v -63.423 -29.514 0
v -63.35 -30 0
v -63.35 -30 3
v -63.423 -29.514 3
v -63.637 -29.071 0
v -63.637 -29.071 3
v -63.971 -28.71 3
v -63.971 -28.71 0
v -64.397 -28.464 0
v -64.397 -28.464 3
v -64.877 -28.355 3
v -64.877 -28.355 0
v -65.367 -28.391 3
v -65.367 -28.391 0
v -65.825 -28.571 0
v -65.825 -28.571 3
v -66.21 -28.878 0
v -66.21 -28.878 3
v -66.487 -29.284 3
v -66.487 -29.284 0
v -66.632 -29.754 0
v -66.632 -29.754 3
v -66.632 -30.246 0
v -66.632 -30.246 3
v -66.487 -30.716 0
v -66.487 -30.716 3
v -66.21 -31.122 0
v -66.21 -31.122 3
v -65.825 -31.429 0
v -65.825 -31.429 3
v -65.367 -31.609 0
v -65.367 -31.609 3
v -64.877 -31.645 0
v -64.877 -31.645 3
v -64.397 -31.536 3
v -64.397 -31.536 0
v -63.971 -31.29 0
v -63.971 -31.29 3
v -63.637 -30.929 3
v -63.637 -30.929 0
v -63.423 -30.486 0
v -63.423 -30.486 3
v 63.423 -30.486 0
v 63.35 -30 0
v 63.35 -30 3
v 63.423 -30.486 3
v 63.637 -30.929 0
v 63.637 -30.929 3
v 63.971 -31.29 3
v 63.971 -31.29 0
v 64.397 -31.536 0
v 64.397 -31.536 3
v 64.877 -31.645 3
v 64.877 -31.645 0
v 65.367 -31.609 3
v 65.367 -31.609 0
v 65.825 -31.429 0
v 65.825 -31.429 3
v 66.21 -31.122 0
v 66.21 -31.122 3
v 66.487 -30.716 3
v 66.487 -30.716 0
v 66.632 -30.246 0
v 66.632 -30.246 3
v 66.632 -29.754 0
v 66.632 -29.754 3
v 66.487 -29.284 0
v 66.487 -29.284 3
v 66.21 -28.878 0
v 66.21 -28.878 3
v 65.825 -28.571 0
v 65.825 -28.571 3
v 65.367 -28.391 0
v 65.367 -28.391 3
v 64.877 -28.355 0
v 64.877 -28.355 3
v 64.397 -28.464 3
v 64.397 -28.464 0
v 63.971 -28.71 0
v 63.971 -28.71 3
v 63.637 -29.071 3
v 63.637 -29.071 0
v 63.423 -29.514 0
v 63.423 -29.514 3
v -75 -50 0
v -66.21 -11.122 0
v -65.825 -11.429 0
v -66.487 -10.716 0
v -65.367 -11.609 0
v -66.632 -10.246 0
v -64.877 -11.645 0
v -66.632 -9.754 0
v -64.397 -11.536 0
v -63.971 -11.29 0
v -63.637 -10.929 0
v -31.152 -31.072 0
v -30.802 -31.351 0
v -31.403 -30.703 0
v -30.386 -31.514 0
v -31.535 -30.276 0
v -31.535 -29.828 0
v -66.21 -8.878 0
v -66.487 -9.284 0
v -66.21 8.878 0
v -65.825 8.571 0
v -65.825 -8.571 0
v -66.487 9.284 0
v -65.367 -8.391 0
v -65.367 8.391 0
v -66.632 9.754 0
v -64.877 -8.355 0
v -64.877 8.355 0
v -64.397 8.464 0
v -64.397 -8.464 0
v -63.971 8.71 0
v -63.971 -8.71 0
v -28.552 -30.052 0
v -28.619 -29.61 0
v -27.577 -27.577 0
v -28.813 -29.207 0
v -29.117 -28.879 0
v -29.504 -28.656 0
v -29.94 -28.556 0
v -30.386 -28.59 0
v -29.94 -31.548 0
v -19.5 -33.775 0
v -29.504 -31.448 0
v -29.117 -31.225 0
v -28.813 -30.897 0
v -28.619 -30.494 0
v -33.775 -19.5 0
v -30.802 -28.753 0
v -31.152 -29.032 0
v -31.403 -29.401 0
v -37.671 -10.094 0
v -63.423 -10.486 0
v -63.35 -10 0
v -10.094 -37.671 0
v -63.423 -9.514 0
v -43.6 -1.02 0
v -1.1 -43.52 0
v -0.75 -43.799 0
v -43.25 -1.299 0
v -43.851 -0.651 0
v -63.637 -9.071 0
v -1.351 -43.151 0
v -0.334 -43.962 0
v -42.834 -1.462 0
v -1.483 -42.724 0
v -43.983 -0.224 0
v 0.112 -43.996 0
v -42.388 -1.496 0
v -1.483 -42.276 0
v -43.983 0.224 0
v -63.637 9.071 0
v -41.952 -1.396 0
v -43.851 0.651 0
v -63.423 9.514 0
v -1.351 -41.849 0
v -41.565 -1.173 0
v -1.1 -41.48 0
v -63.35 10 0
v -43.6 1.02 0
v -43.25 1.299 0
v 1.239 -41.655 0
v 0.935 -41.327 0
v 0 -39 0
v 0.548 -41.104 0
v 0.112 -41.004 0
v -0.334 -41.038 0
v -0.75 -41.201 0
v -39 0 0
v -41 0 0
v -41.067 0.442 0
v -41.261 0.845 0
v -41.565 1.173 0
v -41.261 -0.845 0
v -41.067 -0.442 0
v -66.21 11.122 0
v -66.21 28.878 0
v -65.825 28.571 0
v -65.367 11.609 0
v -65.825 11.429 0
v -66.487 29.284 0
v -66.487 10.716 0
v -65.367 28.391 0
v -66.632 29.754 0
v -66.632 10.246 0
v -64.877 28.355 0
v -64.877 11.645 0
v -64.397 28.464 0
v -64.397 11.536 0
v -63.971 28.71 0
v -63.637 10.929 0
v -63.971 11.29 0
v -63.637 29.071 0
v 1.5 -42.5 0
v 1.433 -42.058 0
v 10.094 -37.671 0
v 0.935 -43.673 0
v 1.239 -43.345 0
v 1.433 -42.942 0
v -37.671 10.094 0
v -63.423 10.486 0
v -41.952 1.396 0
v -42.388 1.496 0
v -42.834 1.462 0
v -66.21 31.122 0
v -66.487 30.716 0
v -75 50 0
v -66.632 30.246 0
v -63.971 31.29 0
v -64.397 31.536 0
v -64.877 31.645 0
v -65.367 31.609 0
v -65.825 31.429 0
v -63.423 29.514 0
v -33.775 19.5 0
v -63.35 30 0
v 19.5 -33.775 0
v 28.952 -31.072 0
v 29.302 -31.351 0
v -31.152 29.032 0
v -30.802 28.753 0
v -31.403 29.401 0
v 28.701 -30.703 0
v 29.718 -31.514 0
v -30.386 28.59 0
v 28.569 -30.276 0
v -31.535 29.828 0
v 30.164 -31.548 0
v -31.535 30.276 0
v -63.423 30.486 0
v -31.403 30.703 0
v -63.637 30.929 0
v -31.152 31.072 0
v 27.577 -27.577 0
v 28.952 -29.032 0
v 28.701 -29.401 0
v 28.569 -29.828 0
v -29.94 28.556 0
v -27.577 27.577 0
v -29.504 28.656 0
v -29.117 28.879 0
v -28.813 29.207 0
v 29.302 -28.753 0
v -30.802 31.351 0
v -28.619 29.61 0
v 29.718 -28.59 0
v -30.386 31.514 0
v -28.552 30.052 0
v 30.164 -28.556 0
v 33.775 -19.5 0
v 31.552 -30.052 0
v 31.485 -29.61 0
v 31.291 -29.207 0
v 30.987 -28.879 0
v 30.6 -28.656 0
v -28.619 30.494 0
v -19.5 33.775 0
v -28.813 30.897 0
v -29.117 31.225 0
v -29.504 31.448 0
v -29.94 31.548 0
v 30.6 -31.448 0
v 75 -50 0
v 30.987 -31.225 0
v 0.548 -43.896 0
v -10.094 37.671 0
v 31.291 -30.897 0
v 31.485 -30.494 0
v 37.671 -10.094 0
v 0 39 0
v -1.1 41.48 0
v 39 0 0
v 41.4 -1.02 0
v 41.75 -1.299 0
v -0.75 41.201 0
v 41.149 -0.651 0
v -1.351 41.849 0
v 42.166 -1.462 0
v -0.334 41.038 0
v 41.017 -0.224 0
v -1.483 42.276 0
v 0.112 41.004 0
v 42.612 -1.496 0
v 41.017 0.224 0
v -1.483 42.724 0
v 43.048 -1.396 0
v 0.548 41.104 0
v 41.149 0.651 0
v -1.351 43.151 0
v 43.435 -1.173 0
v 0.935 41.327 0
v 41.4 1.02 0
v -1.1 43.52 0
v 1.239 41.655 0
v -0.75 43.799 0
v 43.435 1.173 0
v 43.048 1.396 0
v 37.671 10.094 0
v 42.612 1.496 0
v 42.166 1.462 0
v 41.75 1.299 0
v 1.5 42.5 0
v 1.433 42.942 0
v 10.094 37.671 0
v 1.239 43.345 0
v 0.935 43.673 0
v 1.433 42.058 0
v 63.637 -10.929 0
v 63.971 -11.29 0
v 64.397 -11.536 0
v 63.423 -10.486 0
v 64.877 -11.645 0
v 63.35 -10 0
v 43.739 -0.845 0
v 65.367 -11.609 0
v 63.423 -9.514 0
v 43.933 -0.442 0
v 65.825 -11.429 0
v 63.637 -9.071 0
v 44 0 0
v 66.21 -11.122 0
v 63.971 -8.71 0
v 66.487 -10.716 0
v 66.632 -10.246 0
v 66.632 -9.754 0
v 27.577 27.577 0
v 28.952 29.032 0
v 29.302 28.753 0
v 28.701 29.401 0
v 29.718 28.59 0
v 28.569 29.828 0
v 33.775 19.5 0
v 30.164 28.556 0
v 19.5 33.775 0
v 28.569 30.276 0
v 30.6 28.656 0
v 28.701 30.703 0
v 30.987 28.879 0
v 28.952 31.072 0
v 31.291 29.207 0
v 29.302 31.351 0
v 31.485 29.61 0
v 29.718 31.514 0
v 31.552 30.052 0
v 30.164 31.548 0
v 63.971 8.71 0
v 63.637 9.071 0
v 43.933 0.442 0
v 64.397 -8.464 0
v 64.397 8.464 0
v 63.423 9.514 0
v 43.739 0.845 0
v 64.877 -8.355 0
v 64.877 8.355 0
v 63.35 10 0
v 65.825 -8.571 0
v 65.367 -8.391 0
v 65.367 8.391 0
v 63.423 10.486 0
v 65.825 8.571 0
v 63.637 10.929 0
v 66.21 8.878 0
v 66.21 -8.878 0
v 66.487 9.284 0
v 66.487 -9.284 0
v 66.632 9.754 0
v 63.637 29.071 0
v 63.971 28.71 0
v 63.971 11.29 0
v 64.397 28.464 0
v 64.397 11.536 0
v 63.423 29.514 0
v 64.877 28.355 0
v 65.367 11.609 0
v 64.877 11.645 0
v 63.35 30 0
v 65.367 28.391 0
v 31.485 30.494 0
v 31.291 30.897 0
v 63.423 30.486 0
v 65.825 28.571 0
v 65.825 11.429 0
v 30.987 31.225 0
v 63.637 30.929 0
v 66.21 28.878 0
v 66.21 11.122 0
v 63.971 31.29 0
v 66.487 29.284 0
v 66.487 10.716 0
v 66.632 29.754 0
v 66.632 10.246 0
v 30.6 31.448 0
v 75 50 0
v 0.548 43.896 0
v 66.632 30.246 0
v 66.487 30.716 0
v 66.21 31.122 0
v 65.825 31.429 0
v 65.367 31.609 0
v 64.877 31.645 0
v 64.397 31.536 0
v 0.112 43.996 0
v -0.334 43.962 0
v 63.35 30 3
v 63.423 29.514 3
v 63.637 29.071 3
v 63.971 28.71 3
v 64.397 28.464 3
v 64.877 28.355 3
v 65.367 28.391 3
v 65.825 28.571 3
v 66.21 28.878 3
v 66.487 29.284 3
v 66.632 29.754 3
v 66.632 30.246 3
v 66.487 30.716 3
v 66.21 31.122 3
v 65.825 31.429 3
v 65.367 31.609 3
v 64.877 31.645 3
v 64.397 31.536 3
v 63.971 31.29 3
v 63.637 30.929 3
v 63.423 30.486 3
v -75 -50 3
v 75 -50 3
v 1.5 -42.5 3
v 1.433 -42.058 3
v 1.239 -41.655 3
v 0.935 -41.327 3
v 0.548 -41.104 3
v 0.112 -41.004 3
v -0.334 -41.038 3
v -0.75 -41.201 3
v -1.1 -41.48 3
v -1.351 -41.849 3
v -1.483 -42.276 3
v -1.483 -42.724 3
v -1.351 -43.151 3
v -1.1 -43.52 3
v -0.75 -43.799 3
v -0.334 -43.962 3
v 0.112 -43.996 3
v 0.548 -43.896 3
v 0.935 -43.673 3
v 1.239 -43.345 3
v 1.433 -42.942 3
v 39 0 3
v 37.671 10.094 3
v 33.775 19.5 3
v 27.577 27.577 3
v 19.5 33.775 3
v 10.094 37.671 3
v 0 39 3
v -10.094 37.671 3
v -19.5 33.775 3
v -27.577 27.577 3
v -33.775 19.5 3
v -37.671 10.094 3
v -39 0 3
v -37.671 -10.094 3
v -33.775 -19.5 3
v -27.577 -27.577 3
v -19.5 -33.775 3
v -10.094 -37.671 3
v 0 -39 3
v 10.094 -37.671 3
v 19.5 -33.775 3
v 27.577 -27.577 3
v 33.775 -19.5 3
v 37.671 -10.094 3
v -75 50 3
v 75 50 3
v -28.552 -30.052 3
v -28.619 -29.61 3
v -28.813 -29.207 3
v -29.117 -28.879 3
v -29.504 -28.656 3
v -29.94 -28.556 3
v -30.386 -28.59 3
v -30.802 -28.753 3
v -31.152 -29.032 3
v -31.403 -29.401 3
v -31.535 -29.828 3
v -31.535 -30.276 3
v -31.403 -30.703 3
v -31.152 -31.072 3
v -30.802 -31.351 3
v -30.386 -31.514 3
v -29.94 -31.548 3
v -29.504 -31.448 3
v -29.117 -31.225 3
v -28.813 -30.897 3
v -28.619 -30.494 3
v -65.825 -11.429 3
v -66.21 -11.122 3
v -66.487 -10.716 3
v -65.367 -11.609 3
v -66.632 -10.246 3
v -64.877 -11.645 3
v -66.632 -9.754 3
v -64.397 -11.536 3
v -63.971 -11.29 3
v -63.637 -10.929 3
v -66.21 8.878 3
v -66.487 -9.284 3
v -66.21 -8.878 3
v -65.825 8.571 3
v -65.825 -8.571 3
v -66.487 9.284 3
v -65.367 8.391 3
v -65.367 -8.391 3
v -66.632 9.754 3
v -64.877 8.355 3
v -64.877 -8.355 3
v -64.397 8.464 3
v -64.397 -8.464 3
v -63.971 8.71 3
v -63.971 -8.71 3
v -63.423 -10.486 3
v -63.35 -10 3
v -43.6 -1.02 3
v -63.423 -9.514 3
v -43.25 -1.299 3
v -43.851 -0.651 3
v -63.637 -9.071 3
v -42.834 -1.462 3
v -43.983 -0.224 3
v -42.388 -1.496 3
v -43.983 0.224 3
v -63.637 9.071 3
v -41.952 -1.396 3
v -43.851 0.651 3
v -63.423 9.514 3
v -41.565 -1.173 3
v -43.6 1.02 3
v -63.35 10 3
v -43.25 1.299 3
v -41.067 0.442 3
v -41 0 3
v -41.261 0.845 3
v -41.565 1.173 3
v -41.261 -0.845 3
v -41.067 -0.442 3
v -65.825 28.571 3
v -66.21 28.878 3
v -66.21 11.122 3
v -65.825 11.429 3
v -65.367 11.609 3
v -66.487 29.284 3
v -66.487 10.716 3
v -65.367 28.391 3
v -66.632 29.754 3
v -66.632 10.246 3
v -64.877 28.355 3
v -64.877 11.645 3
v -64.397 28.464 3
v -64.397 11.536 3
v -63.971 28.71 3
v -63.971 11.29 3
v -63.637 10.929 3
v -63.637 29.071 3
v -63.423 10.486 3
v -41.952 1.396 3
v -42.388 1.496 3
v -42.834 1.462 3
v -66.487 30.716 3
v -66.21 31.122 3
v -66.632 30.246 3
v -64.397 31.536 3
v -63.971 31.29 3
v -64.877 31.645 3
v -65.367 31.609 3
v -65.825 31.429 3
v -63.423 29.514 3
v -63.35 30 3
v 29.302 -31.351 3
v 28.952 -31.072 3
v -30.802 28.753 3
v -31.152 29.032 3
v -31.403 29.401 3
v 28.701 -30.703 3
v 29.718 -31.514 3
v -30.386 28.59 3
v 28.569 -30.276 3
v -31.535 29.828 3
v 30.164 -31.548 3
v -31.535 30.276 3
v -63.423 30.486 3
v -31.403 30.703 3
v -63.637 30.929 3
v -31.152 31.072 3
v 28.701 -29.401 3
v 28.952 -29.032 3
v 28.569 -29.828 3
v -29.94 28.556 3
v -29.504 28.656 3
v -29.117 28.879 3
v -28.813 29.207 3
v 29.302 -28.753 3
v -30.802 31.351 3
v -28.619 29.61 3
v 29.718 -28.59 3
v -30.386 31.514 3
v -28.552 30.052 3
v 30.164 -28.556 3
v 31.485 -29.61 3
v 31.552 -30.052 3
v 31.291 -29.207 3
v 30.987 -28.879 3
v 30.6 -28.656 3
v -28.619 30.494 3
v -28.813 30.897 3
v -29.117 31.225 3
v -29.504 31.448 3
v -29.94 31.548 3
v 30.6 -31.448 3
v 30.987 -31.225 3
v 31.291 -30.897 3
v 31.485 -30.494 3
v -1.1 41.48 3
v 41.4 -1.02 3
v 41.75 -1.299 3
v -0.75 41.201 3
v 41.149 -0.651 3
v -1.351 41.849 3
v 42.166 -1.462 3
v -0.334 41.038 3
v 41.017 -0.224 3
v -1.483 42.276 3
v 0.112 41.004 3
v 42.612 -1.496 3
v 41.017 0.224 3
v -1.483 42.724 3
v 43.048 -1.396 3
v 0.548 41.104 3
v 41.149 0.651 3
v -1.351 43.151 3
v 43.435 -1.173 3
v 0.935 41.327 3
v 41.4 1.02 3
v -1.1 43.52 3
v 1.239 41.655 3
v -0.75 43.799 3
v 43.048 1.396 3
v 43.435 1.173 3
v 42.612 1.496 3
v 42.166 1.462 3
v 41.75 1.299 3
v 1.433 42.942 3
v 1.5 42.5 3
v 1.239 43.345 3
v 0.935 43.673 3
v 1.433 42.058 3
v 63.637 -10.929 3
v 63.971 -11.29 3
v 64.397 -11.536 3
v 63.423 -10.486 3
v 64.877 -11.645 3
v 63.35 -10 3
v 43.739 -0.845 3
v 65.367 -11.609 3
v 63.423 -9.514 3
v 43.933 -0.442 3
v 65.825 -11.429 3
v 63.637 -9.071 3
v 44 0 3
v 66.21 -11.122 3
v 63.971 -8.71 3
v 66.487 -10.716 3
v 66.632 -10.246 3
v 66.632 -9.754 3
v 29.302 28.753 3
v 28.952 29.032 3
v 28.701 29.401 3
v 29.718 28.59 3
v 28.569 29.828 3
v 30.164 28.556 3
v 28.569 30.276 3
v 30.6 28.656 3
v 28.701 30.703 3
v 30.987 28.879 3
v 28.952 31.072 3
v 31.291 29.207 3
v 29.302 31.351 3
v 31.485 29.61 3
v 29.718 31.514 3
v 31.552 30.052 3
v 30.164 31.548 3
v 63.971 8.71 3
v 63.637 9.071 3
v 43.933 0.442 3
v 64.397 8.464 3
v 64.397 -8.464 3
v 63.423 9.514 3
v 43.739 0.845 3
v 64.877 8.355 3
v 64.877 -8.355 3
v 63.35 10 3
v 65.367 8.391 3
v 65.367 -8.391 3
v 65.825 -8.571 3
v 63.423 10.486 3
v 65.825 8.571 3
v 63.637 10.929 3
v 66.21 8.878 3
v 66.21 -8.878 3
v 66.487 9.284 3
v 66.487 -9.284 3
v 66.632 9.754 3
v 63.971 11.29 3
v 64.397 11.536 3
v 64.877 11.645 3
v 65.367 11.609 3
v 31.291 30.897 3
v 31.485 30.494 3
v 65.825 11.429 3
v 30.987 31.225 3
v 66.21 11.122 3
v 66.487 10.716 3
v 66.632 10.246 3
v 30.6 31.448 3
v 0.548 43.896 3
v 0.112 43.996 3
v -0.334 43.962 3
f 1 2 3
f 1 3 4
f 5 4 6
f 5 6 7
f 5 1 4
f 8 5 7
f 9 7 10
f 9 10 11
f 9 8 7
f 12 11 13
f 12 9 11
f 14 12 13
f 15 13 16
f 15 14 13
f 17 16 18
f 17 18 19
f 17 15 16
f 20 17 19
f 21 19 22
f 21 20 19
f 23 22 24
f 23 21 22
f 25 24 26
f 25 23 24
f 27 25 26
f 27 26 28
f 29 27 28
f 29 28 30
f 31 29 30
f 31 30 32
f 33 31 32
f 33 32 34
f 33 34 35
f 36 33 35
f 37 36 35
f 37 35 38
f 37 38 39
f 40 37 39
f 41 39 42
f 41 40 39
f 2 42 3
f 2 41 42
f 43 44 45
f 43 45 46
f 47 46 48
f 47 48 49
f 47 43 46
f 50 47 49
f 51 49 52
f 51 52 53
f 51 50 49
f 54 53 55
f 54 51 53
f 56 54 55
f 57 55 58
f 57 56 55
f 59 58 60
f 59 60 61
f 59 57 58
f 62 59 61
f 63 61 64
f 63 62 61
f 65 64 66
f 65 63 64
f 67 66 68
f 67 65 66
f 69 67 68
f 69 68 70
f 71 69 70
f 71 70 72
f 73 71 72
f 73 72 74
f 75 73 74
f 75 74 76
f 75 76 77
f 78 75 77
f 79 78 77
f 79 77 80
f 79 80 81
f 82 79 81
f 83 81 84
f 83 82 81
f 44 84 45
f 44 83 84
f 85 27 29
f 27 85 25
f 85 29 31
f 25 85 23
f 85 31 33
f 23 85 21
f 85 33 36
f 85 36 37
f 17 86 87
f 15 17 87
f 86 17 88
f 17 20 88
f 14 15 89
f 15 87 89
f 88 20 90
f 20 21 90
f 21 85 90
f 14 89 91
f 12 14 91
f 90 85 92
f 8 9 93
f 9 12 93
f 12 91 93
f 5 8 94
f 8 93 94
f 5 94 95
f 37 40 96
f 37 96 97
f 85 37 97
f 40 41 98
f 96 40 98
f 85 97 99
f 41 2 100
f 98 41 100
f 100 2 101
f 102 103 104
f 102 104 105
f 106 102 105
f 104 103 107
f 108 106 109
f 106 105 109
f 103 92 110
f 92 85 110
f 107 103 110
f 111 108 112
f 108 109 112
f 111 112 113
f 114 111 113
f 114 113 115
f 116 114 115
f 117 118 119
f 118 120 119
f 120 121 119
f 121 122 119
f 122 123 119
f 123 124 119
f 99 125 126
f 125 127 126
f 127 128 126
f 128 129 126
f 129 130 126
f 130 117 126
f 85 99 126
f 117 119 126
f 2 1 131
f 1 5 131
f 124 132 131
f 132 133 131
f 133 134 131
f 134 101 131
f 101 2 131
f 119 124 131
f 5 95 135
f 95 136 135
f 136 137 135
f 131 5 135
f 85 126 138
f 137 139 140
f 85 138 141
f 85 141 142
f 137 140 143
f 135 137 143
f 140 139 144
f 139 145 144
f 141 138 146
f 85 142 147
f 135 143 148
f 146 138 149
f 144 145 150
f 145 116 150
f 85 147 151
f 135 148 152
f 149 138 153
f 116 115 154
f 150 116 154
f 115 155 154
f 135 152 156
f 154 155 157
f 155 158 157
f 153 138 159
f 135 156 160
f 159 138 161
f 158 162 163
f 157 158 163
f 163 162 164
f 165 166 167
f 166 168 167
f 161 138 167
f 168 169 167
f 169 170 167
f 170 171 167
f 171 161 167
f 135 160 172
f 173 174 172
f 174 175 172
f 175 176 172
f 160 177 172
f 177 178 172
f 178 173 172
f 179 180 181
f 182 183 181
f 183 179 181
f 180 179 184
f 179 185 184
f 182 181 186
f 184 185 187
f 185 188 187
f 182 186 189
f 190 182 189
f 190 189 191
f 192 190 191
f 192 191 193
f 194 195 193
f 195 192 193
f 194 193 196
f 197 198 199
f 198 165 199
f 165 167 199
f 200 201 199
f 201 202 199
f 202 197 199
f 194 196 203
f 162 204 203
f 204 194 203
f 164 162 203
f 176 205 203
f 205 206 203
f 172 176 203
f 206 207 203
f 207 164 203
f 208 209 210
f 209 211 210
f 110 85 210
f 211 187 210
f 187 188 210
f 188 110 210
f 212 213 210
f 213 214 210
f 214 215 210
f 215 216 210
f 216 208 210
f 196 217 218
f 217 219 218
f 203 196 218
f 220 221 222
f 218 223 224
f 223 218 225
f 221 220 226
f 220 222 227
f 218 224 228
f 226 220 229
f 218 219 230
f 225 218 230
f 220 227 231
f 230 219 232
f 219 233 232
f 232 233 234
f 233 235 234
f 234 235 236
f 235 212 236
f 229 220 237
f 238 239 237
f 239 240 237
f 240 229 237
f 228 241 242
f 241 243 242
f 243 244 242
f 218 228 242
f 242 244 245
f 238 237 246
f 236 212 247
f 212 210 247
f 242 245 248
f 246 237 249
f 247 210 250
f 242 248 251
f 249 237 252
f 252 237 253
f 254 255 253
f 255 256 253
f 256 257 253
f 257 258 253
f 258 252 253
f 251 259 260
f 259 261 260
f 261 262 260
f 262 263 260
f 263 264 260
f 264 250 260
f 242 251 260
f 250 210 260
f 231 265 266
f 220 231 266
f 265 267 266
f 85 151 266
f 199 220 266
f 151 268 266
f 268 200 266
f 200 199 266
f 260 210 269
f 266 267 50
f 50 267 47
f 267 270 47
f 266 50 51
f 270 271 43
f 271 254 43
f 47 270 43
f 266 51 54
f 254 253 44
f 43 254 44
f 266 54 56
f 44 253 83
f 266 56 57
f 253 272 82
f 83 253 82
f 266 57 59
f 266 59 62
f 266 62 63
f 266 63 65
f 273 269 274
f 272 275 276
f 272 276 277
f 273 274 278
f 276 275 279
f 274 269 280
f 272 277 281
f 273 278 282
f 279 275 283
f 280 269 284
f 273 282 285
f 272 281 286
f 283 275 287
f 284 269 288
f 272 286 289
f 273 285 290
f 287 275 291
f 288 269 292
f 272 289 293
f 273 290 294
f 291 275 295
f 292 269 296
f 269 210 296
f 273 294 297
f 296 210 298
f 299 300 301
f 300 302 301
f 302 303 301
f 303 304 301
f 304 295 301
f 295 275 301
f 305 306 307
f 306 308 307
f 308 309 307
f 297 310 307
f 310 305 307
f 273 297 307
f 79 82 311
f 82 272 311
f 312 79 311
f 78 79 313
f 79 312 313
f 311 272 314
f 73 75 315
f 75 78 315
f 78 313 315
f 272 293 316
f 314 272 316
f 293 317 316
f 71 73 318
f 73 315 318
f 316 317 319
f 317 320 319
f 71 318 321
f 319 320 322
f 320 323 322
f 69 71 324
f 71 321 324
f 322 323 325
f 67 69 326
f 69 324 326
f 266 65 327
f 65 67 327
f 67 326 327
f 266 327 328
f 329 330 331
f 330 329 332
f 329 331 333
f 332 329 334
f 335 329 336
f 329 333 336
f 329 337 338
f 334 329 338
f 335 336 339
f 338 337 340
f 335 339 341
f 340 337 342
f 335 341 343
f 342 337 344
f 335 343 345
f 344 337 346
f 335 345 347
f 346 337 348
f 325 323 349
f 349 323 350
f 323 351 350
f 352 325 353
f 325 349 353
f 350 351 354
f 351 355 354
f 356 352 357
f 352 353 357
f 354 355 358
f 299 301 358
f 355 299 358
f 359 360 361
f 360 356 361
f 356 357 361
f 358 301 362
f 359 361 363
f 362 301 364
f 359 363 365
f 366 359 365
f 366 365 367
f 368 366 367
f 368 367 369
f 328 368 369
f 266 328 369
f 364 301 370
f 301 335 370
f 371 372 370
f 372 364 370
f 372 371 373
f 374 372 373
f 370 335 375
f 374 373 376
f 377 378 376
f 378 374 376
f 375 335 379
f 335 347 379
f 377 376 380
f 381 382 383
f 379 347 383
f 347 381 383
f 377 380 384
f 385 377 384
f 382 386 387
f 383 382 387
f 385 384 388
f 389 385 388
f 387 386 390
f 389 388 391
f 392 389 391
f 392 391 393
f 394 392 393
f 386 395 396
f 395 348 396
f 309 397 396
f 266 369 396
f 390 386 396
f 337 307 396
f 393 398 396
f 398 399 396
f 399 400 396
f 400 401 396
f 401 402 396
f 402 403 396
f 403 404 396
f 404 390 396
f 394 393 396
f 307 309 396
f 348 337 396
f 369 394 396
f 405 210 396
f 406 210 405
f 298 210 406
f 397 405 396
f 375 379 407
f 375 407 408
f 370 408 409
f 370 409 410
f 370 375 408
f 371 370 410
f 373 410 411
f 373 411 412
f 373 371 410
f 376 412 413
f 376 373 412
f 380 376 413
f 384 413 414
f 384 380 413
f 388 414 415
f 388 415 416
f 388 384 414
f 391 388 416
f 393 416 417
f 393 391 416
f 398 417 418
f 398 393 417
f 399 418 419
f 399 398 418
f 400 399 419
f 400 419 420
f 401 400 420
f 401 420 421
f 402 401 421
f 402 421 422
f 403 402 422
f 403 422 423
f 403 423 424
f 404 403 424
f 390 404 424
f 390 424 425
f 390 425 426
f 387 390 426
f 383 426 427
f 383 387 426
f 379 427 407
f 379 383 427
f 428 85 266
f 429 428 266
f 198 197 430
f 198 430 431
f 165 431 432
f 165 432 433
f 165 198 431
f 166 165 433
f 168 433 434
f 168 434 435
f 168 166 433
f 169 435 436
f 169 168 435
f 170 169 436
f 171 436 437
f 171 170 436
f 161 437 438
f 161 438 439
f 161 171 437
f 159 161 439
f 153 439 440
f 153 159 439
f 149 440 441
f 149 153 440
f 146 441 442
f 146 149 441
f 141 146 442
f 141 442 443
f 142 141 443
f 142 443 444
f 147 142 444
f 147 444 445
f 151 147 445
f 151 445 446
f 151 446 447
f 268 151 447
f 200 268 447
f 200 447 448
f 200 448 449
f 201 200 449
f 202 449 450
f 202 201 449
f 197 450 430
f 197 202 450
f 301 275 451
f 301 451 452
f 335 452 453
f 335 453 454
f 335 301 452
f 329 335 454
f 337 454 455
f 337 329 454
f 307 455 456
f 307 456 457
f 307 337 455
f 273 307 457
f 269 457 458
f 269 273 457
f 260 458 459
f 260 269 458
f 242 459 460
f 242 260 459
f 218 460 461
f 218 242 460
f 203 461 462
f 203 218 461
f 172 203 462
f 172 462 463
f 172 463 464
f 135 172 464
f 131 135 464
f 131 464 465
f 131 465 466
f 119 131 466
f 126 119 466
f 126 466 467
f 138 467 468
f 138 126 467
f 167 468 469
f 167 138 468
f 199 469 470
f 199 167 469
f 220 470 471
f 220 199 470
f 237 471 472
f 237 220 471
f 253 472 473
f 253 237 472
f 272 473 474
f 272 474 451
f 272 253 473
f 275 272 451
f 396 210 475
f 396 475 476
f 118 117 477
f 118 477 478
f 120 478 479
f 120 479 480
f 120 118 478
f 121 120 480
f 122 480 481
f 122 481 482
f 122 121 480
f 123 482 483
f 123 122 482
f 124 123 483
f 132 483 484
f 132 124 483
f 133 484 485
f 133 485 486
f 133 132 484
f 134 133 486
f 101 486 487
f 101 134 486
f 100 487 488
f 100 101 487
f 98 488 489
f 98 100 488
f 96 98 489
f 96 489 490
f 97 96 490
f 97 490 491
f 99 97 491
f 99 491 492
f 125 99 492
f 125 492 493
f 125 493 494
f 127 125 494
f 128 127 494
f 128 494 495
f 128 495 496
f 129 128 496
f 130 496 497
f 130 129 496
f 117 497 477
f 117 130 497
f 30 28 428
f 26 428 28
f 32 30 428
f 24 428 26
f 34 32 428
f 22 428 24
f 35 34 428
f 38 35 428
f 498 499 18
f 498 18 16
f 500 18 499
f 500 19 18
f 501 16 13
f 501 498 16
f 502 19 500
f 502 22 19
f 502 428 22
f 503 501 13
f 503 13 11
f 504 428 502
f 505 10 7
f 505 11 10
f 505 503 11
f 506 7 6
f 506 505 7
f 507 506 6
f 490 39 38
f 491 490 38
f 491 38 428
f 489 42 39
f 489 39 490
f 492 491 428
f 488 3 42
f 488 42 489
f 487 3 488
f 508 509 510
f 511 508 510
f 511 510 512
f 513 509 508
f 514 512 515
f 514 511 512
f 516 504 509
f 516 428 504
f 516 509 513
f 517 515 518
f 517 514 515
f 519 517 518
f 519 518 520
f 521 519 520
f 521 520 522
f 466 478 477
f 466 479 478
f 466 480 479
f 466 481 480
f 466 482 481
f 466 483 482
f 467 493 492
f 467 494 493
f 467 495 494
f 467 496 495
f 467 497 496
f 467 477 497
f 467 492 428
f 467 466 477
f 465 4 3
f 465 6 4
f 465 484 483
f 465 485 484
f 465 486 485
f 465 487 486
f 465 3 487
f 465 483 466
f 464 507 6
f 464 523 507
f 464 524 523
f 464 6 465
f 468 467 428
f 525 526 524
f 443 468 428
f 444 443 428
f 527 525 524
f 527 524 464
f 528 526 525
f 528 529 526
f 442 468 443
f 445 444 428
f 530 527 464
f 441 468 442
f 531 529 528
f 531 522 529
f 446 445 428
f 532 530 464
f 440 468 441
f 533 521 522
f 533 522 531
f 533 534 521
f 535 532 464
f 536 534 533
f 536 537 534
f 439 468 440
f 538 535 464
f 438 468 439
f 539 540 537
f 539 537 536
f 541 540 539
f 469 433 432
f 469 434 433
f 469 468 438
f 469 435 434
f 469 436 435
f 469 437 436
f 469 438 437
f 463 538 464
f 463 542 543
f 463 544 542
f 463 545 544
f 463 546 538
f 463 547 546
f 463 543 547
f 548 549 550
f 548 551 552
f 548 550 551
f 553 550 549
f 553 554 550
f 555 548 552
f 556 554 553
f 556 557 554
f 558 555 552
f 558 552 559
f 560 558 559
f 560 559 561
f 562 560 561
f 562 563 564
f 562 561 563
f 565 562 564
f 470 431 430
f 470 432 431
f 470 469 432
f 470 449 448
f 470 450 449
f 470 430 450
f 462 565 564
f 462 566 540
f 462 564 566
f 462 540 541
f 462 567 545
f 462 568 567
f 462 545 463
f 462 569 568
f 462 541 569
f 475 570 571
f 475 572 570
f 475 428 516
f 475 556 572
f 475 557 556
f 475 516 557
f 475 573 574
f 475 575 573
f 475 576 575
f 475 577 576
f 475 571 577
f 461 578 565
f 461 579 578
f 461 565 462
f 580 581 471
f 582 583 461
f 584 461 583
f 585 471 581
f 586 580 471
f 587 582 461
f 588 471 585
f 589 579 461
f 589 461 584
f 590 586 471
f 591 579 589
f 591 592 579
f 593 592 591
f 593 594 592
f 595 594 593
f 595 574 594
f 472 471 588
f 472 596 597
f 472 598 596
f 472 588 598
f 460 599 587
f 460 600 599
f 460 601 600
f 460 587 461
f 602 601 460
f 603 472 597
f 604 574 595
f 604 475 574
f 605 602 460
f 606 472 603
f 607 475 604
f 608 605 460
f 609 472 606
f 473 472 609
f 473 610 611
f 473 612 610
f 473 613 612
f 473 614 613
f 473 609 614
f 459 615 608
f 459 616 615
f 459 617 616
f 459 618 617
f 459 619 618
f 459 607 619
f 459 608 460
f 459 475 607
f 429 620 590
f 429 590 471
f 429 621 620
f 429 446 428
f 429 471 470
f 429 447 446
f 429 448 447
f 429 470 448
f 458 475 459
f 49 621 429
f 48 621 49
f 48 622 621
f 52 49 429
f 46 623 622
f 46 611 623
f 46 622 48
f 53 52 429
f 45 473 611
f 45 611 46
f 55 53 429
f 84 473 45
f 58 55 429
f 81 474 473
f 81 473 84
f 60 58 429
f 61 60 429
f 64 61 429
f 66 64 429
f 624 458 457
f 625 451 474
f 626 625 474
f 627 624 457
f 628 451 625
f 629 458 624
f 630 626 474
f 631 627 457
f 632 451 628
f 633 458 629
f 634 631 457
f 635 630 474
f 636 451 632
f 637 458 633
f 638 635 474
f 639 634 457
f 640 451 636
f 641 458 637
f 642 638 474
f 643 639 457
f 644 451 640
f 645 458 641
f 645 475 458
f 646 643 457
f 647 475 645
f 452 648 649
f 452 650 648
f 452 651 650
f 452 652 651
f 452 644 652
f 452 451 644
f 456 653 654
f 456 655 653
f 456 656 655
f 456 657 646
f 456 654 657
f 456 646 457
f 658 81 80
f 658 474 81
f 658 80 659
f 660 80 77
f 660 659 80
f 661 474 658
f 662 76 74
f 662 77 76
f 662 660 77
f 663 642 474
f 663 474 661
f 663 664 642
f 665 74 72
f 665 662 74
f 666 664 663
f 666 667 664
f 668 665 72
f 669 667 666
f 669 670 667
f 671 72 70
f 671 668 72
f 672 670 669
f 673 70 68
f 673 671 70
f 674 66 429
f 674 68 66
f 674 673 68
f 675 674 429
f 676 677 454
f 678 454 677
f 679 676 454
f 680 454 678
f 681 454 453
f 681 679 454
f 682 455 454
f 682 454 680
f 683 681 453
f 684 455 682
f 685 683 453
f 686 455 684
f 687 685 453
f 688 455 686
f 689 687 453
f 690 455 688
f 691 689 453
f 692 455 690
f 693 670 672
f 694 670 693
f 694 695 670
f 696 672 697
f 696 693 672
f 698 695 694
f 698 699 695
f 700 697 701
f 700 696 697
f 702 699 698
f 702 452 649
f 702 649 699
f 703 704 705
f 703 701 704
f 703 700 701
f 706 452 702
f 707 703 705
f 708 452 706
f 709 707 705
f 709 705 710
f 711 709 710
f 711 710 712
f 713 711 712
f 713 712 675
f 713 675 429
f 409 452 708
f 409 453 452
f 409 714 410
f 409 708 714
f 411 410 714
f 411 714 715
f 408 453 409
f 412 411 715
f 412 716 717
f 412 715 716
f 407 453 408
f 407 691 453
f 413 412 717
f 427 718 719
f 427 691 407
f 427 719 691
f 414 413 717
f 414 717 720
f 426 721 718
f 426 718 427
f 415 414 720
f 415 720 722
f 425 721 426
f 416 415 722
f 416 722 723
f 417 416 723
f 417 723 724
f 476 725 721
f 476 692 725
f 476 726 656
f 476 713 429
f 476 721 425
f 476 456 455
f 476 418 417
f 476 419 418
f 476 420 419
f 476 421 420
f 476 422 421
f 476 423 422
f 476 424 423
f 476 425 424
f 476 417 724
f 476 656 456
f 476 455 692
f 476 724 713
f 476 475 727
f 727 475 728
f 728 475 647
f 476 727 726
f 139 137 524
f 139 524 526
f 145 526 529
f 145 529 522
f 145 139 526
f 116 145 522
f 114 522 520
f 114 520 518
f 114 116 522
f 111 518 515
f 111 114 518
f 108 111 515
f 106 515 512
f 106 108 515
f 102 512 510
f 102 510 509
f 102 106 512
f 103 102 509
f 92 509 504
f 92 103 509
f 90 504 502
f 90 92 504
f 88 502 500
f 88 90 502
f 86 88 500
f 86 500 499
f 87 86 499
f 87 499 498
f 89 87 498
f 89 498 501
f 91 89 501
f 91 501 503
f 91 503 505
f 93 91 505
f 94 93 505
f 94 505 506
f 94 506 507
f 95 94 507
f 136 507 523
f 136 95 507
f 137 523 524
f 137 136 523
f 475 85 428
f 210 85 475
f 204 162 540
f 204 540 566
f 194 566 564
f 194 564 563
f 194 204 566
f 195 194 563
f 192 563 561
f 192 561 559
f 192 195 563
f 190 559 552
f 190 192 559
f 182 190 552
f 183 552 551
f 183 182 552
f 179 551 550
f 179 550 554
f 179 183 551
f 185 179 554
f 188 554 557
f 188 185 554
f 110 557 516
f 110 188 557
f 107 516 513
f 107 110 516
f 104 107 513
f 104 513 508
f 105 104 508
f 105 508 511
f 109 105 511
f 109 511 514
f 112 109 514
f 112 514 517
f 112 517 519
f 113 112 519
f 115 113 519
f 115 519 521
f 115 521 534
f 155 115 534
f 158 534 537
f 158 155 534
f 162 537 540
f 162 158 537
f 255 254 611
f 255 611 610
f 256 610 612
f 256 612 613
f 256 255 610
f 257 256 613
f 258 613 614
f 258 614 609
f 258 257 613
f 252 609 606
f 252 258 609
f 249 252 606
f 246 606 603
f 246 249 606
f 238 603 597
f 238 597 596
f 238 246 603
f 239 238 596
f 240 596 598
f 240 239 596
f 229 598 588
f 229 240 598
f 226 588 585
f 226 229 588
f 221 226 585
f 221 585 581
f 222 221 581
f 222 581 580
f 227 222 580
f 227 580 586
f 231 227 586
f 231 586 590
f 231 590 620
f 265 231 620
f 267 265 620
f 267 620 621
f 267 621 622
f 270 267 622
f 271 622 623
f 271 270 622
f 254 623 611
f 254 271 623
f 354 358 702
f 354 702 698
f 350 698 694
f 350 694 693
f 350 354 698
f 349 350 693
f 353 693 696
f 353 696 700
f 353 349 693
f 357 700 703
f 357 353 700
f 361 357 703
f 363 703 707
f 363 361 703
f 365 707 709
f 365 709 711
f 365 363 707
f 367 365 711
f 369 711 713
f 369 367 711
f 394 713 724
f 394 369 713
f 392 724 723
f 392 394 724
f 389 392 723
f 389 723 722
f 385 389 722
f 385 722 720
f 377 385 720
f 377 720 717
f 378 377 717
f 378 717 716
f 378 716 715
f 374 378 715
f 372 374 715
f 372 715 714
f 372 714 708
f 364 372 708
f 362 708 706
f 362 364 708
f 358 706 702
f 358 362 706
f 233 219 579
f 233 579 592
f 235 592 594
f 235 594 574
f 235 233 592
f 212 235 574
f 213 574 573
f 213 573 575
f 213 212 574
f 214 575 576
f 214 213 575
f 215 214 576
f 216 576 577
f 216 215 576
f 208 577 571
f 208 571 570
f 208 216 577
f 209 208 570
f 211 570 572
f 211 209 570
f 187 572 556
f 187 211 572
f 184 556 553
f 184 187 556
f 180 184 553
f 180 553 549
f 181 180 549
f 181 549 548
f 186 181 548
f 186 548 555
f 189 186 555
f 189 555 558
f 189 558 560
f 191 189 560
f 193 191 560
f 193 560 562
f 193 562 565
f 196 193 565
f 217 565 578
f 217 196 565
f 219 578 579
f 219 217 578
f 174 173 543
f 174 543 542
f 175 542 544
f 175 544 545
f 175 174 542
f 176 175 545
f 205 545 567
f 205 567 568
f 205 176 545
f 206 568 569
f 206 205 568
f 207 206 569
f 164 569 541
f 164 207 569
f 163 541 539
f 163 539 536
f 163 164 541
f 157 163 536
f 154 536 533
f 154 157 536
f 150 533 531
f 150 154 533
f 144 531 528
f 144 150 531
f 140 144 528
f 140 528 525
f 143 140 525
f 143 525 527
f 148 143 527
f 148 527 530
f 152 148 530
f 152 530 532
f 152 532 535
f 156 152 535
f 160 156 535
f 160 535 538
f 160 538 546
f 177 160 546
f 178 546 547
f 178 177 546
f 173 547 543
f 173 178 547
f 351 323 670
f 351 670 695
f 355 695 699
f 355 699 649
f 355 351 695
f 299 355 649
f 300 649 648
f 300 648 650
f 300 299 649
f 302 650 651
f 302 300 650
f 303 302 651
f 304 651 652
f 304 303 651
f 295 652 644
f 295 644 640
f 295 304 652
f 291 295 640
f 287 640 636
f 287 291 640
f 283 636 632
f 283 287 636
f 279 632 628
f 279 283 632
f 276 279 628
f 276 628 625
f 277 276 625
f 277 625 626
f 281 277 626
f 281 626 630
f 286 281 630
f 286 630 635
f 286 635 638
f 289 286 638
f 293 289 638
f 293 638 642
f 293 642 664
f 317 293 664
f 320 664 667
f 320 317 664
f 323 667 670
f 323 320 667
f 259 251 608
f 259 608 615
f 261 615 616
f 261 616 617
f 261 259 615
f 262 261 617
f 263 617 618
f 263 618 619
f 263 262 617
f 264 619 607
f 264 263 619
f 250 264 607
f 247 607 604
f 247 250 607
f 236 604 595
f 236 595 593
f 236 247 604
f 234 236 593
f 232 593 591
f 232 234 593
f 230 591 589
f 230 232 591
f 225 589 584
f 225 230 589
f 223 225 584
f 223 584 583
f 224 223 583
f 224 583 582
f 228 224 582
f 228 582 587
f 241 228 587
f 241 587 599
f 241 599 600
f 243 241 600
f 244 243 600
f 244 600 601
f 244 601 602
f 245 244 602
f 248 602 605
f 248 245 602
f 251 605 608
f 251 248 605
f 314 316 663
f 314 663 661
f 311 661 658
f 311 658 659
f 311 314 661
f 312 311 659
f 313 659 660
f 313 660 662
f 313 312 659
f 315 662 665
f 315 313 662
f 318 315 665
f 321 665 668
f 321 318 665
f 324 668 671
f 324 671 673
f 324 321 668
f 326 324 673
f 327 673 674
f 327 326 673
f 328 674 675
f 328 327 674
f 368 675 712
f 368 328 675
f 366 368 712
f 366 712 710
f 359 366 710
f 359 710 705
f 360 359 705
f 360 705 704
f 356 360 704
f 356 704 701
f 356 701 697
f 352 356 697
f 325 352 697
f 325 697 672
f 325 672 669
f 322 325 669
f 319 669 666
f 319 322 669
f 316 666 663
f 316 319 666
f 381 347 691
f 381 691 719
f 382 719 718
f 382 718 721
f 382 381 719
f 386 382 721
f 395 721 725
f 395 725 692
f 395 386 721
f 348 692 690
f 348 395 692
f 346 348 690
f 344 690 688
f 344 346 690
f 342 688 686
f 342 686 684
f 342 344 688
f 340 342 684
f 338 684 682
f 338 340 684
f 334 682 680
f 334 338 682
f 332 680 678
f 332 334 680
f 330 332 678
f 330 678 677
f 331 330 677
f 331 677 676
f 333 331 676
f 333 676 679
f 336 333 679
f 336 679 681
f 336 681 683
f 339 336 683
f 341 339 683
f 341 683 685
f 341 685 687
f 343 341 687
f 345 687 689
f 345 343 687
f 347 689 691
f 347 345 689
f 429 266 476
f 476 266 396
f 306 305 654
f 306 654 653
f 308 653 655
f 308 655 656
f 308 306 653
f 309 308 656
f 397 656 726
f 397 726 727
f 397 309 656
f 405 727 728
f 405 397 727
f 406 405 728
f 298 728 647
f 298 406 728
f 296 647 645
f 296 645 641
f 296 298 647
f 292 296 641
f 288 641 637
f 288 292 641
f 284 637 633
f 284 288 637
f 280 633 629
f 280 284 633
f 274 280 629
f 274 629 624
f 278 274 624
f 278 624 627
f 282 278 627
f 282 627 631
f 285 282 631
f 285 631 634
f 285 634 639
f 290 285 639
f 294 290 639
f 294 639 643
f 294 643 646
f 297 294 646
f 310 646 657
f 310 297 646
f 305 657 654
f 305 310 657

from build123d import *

# Parameters (mm, degrees)
SKETCH_1_W      = 150
SKETCH_1_H      = 100
SKETCH_1_R      = 39
SKETCH_1_R_2    = 1.5
SKETCH_1_R_3    = 1.65
EXTRUDE_1_DEPTH = 3


with BuildPart() as part:
    # 草图1 → 凸台-拉伸1 (new body)
    with BuildSketch(Plane.XY):
        Rectangle(SKETCH_1_W, SKETCH_1_H)
        Circle(SKETCH_1_R, mode=Mode.SUBTRACT)
        with Locations((42.5, 0)):
            Circle(SKETCH_1_R_2, mode=Mode.SUBTRACT)
        with Locations((30.0520382, -30.0520382)):
            Circle(SKETCH_1_R_2, mode=Mode.SUBTRACT)
        with Locations((0, -42.5)):
            Circle(SKETCH_1_R_2, mode=Mode.SUBTRACT)
        with Locations((-30.0520382, -30.0520382)):
            Circle(SKETCH_1_R_2, mode=Mode.SUBTRACT)
        with Locations((-42.5, 0)):
            Circle(SKETCH_1_R_2, mode=Mode.SUBTRACT)
        with Locations((-30.0520382, 30.0520382)):
            Circle(SKETCH_1_R_2, mode=Mode.SUBTRACT)
        with Locations((0, 42.5)):
            Circle(SKETCH_1_R_2, mode=Mode.SUBTRACT)
        with Locations((30.0520382, 30.0520382)):
            Circle(SKETCH_1_R_2, mode=Mode.SUBTRACT)
        with Locations((-65, 30)):
            Circle(SKETCH_1_R_3, mode=Mode.SUBTRACT)
        with Locations((-65, 10)):
            Circle(SKETCH_1_R_3, mode=Mode.SUBTRACT)
        with Locations((-65, -10)):
            Circle(SKETCH_1_R_3, mode=Mode.SUBTRACT)
        with Locations((-65, -30)):
            Circle(SKETCH_1_R_3, mode=Mode.SUBTRACT)
        with Locations(Location((65, -30, 0), (0, 0, 180))):
            Circle(SKETCH_1_R_3, mode=Mode.SUBTRACT)
        with Locations(Location((65, -10, 0), (0, 0, 180))):
            Circle(SKETCH_1_R_3, mode=Mode.SUBTRACT)
        with Locations(Location((65, 10, 0), (0, 0, 180))):
            Circle(SKETCH_1_R_3, mode=Mode.SUBTRACT)
        with Locations(Location((65, 30, 0), (0, 0, 180))):
            Circle(SKETCH_1_R_3, mode=Mode.SUBTRACT)
    extrude(amount=EXTRUDE_1_DEPTH)


solid = part.part
